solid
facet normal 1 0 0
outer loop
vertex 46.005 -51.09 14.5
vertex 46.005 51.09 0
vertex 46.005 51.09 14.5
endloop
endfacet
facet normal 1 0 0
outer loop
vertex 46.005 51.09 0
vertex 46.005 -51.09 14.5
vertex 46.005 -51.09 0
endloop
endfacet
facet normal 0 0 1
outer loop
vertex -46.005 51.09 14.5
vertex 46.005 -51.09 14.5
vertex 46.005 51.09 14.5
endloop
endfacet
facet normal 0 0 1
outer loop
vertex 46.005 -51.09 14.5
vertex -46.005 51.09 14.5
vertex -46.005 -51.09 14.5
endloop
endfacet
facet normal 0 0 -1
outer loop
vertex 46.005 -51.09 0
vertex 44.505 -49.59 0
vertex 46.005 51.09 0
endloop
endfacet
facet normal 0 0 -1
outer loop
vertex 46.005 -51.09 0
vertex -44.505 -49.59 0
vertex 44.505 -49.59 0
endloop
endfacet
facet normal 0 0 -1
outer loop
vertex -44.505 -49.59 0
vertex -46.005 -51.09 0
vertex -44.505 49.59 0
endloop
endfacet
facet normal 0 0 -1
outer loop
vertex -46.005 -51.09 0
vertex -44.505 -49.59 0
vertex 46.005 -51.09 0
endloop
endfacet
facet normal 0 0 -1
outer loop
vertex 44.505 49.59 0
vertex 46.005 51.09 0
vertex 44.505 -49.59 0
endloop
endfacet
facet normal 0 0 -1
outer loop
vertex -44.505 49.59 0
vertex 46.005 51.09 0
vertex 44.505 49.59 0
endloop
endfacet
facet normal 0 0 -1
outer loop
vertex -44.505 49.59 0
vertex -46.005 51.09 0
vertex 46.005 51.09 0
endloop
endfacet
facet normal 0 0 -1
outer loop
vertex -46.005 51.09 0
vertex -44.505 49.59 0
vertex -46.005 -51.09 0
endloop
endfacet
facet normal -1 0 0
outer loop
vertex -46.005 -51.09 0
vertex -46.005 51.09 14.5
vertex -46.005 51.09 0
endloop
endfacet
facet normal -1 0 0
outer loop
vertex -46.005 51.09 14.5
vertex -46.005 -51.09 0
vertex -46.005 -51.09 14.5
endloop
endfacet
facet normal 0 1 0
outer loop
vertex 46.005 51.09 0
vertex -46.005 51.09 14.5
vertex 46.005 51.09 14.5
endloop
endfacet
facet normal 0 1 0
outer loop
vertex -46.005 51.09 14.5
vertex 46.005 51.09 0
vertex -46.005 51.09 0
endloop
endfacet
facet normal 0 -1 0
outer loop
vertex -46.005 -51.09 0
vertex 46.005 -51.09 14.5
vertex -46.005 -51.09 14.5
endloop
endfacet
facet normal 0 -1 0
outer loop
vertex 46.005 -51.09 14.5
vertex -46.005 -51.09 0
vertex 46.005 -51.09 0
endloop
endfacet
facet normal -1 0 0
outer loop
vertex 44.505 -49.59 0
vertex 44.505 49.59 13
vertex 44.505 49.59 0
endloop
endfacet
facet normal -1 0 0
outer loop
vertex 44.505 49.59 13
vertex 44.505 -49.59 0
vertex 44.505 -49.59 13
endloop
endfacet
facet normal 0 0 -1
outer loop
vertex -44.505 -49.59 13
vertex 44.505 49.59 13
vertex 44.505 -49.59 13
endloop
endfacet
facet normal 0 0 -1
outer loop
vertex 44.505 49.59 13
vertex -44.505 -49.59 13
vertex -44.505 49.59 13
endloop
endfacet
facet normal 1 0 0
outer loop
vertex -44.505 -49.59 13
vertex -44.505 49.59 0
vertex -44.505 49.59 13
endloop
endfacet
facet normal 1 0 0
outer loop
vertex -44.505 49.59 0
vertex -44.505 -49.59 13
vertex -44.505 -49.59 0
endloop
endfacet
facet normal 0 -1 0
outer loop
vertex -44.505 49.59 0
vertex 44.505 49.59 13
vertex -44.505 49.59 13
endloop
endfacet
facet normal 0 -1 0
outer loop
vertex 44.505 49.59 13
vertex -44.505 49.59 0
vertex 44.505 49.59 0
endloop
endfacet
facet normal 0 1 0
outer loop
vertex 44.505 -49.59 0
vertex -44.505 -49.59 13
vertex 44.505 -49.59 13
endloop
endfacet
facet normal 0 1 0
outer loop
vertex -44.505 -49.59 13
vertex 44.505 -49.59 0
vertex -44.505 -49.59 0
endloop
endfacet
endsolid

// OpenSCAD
espesor=1.5;
toleranciaAdentro=1;


//medidas tarjeta

lonX=87.01;
lonY=97.18;
lonZ=12;
altoPlaca=1.5;

difference(){
   
//medidas externas 
ExlonX=lonX+(toleranciaAdentro+espesor)*2;
ExlonY=lonY+(toleranciaAdentro+espesor)*2;
ExlonZ=lonZ+(toleranciaAdentro+espesor);
    
//medidas internas
InlonX=lonX+(toleranciaAdentro)*2;
InlonY=lonY+(toleranciaAdentro)*2;
InlonZ=lonZ+(toleranciaAdentro);
    
 translate([-ExlonX/2,-ExlonY/2,0])
cube([ExlonX,ExlonY,ExlonZ]);
    
    
  translate([-InlonX/2,-InlonY/2,-InlonZ])
cube([InlonX,InlonY,InlonZ*2]);
  
 
  
}
